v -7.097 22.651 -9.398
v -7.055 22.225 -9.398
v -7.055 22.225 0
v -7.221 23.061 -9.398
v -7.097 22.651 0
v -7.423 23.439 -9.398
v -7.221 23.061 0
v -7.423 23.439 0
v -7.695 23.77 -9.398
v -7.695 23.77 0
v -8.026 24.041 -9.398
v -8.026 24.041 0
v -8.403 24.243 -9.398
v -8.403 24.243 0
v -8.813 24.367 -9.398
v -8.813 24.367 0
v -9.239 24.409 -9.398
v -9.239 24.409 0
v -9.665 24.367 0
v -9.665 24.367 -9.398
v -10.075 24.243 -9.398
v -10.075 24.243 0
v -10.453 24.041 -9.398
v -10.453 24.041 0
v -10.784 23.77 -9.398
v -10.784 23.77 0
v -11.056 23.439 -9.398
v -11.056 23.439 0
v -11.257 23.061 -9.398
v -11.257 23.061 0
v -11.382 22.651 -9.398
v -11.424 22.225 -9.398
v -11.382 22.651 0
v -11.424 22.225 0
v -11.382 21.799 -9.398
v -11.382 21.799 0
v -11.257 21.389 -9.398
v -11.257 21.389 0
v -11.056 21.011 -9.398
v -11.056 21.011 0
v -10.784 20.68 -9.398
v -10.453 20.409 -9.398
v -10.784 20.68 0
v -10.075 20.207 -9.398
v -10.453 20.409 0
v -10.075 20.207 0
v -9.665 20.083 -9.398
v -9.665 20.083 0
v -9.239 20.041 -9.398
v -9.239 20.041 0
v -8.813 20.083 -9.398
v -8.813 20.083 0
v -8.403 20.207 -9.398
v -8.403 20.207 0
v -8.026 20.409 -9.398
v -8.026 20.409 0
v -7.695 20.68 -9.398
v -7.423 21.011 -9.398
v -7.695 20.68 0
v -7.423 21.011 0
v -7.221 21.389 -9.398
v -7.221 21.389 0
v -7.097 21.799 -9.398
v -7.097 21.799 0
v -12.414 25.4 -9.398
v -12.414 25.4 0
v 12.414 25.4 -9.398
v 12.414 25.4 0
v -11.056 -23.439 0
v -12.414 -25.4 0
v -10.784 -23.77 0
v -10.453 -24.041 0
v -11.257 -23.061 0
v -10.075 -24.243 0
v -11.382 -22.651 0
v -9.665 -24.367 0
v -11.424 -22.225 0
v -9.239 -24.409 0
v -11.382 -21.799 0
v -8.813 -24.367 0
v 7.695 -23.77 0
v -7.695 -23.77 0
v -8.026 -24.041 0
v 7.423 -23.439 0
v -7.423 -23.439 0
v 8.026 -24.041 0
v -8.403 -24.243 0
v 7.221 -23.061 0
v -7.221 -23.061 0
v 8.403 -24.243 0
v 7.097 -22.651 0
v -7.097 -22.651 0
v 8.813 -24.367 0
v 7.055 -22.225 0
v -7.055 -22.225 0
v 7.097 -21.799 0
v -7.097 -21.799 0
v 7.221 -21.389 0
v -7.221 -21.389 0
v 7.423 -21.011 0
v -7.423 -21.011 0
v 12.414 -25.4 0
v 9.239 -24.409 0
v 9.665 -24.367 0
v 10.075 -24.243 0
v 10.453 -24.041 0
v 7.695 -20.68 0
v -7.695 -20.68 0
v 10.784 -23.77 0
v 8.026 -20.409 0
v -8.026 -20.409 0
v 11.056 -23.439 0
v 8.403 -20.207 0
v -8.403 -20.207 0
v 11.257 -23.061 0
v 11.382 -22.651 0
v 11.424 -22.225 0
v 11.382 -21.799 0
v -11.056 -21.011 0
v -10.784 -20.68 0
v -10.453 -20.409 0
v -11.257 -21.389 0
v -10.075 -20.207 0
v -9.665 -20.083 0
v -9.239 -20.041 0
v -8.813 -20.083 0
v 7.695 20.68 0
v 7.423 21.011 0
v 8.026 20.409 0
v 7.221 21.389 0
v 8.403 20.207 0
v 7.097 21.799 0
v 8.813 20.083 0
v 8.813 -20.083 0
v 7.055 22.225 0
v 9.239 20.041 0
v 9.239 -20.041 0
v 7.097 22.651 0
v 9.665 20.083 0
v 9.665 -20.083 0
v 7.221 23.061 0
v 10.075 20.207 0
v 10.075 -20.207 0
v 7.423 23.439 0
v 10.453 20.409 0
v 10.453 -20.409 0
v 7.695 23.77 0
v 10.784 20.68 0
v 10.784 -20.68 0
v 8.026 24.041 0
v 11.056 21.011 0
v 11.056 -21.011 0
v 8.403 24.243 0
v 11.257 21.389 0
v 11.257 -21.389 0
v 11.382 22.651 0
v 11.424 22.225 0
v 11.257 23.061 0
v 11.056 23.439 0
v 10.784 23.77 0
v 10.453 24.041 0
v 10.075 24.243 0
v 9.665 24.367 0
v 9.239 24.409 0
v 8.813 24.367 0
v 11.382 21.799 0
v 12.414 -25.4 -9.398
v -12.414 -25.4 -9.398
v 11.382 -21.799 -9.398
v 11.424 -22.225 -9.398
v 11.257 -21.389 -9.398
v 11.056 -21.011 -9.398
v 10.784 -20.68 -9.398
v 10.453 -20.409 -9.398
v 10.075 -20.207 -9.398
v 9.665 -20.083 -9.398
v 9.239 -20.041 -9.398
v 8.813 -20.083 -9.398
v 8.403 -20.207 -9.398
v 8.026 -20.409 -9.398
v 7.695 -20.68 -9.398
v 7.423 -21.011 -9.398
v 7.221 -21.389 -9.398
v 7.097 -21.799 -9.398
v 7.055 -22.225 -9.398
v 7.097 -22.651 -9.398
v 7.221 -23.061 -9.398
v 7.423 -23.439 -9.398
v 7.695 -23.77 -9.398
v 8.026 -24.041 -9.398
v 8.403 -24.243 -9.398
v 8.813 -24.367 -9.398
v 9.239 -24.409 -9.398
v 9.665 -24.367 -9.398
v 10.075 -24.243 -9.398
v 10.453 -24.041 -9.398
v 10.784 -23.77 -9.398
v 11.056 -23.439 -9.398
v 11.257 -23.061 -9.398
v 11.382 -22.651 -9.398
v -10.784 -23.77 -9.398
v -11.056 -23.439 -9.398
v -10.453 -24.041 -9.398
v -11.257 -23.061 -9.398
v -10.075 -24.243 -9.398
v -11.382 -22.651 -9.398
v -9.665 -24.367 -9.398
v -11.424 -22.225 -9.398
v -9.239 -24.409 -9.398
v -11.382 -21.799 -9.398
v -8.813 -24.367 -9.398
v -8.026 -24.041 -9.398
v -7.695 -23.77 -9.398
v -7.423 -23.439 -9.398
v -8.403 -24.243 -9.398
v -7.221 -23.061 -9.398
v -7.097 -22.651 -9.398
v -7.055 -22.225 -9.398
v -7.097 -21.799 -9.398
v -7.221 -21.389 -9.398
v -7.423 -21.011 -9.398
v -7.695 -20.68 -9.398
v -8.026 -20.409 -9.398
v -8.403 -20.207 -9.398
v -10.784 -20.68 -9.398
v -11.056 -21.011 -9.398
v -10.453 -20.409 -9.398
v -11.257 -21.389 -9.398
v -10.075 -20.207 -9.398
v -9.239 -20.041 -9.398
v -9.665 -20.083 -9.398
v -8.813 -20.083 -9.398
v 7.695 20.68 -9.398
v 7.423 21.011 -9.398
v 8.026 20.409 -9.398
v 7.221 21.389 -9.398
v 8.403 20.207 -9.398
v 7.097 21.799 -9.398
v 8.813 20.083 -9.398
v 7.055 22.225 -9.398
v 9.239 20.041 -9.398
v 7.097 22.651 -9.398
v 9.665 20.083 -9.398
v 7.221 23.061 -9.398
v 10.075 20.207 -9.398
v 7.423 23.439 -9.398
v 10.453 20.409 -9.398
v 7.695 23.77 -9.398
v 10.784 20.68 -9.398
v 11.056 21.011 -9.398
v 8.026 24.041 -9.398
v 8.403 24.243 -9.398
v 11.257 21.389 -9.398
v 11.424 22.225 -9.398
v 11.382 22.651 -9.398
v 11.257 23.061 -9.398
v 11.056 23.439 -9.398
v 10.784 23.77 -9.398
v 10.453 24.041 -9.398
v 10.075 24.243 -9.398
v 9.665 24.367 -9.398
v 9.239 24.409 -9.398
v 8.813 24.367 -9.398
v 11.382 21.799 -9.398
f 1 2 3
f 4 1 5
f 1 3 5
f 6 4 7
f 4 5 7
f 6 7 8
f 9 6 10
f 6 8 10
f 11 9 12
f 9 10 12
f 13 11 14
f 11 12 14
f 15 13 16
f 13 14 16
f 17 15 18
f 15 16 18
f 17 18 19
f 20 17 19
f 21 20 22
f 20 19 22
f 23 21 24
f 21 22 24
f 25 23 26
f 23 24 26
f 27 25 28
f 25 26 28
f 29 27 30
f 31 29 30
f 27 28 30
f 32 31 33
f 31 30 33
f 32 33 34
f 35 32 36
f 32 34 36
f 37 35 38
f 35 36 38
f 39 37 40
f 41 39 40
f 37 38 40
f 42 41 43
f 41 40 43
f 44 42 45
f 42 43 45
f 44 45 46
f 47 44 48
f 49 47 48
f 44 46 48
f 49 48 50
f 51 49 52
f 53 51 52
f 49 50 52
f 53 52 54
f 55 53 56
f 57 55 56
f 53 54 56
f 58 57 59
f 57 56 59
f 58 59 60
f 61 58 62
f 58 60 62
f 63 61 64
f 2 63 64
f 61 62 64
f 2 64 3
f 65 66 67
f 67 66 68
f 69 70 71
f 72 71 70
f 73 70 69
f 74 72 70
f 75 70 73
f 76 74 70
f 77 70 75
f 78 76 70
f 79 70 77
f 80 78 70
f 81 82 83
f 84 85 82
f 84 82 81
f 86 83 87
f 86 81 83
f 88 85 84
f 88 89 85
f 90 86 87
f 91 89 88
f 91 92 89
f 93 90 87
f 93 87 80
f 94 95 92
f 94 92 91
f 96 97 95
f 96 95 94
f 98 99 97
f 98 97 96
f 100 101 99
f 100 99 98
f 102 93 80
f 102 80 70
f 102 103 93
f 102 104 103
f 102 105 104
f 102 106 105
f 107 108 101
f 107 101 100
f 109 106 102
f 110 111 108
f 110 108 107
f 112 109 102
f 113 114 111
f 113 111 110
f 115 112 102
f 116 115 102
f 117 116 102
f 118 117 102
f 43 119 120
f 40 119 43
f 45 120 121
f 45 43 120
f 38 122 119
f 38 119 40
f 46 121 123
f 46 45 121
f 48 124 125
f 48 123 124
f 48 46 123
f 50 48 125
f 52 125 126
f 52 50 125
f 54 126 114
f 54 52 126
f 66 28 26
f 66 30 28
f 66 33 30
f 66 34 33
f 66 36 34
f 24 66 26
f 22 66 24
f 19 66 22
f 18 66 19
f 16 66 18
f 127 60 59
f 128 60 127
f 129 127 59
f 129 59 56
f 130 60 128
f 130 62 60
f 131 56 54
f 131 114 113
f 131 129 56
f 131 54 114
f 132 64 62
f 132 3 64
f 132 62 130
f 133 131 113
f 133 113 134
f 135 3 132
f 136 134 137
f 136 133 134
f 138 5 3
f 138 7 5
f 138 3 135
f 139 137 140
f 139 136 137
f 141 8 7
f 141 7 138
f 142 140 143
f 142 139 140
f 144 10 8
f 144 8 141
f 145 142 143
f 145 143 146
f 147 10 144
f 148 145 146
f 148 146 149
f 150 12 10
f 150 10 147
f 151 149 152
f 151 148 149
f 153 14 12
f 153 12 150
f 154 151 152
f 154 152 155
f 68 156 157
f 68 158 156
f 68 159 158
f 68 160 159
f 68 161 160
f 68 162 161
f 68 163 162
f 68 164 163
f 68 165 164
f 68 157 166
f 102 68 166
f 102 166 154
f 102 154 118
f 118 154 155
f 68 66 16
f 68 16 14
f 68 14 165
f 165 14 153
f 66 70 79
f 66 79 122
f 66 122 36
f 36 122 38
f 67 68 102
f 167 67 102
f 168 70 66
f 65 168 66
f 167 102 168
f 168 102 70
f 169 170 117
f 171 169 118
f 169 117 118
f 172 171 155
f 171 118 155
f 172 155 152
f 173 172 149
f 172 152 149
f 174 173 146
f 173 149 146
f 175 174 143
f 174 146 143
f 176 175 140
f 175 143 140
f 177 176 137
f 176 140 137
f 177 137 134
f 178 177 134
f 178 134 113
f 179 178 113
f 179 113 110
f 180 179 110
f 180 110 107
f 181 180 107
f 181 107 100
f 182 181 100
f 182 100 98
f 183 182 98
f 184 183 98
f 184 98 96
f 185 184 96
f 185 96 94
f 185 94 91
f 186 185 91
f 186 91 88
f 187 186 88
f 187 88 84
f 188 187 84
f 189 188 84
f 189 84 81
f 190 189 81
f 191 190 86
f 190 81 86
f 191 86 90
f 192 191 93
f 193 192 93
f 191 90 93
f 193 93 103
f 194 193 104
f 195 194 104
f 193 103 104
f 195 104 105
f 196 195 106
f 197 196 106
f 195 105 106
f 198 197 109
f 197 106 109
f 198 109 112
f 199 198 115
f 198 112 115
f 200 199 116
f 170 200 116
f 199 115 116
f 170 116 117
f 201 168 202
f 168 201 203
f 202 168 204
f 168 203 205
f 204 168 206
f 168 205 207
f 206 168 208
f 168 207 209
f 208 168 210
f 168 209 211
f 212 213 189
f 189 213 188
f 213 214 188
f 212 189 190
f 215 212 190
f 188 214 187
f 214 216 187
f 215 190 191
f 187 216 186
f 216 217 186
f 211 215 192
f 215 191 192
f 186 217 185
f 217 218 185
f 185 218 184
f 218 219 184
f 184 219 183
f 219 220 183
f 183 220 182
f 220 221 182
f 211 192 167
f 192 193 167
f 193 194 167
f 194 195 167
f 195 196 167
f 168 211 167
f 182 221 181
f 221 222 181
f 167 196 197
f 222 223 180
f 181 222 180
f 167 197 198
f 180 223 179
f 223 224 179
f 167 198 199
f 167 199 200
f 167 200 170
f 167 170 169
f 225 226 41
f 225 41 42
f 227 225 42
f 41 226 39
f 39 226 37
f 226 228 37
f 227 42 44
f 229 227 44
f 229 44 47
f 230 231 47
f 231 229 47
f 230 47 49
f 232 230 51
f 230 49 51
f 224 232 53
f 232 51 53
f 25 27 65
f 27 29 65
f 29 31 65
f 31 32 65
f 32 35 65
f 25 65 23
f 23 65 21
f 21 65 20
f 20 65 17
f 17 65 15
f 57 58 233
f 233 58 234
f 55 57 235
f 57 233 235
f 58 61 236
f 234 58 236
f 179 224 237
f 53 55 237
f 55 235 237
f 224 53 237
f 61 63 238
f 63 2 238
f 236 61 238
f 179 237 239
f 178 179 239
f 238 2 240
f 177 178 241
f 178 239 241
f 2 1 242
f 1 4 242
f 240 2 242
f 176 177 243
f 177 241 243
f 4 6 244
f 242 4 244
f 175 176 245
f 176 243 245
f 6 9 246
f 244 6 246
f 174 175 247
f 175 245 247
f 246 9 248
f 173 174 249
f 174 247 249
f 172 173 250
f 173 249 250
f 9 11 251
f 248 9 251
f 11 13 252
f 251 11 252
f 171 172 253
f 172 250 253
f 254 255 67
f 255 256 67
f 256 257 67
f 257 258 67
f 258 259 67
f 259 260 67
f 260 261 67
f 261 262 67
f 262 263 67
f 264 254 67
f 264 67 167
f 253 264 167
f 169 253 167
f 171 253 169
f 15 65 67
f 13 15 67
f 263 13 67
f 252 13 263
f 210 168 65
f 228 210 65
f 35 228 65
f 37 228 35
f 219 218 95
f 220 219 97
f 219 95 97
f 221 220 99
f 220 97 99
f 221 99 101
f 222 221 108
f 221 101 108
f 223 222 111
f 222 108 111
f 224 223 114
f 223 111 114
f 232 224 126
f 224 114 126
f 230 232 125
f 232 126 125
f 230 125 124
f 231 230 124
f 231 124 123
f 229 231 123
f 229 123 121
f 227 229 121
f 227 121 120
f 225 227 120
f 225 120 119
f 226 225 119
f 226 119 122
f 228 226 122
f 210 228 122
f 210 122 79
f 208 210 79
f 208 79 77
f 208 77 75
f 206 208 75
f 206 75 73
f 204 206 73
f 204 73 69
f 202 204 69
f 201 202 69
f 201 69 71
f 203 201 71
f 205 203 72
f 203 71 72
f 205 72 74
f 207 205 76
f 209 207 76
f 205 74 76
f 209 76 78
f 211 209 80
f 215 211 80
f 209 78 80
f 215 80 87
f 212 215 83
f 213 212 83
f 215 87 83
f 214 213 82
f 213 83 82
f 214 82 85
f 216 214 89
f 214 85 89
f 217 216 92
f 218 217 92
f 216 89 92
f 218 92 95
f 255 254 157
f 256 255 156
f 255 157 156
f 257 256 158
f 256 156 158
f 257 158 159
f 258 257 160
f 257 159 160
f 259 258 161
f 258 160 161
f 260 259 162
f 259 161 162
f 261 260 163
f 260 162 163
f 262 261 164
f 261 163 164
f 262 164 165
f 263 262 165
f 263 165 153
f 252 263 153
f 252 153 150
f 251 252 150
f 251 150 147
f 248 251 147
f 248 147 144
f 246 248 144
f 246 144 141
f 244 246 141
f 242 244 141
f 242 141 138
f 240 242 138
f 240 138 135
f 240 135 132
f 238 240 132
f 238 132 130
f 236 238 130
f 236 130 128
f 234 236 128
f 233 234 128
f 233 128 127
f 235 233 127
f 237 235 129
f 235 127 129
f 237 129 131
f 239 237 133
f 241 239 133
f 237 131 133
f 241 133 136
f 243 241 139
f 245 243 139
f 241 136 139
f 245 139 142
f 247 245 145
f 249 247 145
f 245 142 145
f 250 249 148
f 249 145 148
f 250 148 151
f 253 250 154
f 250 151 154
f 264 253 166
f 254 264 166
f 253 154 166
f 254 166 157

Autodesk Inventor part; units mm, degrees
ref_plane "YZ Plane" through (0, 0, 0) normal (1, 0, 0) x (0, 1, 0)
ref_plane "XZ Plane" through (0, 0, 0) normal (0, 1, 0) x (-1, 0, 0)
ref_plane "XY Plane" through (0, 0, 0) normal (0, 0, 1) x (1, 0, 0)
sketch "Sketch1" plane through (0, 0, 0) normal (0, 0, 1) x (1, 0, 0)
  line L0 (-12.4142, 25.4) -> (12.4142, 25.4)
  line L1 (12.4142, 25.4) -> (12.4142, -25.4)
  line L2 (12.4142, -25.4) -> (-12.4142, -25.4)
  line L3 (-12.4142, -25.4) -> (-12.4142, 25.4)
  circle A0 centre (-9.2393, 22.225) radius 2.1844
  circle A1 centre (-9.2393, -22.225) radius 2.1844
  circle A2 centre (9.2393, -22.225) radius 2.1844
  circle A3 centre (9.2393, 22.225) radius 2.1844
  point P0 (0, 0)
  point P1 (-12.4143, 0)
  point P2 (0, 25.4)
  dimension "d0" = 24.8285
  dimension "d1" = 50.8
  dimension "d2" = 4.3688
  dimension "d3" = 47.625
  dimension "d4" = 3.175
  dimension "d5" = 4.3688
  dimension "d6" = 4.3688
  dimension "d7" = 4.3688
  dimension "d8" = 3.175
  dimension "d9" = 3.175
extrude "Extrusion1" add sketch "Sketch1" against normal blind 9.398
properties part number "Ch7(5) Part 9 Cover Plate"
